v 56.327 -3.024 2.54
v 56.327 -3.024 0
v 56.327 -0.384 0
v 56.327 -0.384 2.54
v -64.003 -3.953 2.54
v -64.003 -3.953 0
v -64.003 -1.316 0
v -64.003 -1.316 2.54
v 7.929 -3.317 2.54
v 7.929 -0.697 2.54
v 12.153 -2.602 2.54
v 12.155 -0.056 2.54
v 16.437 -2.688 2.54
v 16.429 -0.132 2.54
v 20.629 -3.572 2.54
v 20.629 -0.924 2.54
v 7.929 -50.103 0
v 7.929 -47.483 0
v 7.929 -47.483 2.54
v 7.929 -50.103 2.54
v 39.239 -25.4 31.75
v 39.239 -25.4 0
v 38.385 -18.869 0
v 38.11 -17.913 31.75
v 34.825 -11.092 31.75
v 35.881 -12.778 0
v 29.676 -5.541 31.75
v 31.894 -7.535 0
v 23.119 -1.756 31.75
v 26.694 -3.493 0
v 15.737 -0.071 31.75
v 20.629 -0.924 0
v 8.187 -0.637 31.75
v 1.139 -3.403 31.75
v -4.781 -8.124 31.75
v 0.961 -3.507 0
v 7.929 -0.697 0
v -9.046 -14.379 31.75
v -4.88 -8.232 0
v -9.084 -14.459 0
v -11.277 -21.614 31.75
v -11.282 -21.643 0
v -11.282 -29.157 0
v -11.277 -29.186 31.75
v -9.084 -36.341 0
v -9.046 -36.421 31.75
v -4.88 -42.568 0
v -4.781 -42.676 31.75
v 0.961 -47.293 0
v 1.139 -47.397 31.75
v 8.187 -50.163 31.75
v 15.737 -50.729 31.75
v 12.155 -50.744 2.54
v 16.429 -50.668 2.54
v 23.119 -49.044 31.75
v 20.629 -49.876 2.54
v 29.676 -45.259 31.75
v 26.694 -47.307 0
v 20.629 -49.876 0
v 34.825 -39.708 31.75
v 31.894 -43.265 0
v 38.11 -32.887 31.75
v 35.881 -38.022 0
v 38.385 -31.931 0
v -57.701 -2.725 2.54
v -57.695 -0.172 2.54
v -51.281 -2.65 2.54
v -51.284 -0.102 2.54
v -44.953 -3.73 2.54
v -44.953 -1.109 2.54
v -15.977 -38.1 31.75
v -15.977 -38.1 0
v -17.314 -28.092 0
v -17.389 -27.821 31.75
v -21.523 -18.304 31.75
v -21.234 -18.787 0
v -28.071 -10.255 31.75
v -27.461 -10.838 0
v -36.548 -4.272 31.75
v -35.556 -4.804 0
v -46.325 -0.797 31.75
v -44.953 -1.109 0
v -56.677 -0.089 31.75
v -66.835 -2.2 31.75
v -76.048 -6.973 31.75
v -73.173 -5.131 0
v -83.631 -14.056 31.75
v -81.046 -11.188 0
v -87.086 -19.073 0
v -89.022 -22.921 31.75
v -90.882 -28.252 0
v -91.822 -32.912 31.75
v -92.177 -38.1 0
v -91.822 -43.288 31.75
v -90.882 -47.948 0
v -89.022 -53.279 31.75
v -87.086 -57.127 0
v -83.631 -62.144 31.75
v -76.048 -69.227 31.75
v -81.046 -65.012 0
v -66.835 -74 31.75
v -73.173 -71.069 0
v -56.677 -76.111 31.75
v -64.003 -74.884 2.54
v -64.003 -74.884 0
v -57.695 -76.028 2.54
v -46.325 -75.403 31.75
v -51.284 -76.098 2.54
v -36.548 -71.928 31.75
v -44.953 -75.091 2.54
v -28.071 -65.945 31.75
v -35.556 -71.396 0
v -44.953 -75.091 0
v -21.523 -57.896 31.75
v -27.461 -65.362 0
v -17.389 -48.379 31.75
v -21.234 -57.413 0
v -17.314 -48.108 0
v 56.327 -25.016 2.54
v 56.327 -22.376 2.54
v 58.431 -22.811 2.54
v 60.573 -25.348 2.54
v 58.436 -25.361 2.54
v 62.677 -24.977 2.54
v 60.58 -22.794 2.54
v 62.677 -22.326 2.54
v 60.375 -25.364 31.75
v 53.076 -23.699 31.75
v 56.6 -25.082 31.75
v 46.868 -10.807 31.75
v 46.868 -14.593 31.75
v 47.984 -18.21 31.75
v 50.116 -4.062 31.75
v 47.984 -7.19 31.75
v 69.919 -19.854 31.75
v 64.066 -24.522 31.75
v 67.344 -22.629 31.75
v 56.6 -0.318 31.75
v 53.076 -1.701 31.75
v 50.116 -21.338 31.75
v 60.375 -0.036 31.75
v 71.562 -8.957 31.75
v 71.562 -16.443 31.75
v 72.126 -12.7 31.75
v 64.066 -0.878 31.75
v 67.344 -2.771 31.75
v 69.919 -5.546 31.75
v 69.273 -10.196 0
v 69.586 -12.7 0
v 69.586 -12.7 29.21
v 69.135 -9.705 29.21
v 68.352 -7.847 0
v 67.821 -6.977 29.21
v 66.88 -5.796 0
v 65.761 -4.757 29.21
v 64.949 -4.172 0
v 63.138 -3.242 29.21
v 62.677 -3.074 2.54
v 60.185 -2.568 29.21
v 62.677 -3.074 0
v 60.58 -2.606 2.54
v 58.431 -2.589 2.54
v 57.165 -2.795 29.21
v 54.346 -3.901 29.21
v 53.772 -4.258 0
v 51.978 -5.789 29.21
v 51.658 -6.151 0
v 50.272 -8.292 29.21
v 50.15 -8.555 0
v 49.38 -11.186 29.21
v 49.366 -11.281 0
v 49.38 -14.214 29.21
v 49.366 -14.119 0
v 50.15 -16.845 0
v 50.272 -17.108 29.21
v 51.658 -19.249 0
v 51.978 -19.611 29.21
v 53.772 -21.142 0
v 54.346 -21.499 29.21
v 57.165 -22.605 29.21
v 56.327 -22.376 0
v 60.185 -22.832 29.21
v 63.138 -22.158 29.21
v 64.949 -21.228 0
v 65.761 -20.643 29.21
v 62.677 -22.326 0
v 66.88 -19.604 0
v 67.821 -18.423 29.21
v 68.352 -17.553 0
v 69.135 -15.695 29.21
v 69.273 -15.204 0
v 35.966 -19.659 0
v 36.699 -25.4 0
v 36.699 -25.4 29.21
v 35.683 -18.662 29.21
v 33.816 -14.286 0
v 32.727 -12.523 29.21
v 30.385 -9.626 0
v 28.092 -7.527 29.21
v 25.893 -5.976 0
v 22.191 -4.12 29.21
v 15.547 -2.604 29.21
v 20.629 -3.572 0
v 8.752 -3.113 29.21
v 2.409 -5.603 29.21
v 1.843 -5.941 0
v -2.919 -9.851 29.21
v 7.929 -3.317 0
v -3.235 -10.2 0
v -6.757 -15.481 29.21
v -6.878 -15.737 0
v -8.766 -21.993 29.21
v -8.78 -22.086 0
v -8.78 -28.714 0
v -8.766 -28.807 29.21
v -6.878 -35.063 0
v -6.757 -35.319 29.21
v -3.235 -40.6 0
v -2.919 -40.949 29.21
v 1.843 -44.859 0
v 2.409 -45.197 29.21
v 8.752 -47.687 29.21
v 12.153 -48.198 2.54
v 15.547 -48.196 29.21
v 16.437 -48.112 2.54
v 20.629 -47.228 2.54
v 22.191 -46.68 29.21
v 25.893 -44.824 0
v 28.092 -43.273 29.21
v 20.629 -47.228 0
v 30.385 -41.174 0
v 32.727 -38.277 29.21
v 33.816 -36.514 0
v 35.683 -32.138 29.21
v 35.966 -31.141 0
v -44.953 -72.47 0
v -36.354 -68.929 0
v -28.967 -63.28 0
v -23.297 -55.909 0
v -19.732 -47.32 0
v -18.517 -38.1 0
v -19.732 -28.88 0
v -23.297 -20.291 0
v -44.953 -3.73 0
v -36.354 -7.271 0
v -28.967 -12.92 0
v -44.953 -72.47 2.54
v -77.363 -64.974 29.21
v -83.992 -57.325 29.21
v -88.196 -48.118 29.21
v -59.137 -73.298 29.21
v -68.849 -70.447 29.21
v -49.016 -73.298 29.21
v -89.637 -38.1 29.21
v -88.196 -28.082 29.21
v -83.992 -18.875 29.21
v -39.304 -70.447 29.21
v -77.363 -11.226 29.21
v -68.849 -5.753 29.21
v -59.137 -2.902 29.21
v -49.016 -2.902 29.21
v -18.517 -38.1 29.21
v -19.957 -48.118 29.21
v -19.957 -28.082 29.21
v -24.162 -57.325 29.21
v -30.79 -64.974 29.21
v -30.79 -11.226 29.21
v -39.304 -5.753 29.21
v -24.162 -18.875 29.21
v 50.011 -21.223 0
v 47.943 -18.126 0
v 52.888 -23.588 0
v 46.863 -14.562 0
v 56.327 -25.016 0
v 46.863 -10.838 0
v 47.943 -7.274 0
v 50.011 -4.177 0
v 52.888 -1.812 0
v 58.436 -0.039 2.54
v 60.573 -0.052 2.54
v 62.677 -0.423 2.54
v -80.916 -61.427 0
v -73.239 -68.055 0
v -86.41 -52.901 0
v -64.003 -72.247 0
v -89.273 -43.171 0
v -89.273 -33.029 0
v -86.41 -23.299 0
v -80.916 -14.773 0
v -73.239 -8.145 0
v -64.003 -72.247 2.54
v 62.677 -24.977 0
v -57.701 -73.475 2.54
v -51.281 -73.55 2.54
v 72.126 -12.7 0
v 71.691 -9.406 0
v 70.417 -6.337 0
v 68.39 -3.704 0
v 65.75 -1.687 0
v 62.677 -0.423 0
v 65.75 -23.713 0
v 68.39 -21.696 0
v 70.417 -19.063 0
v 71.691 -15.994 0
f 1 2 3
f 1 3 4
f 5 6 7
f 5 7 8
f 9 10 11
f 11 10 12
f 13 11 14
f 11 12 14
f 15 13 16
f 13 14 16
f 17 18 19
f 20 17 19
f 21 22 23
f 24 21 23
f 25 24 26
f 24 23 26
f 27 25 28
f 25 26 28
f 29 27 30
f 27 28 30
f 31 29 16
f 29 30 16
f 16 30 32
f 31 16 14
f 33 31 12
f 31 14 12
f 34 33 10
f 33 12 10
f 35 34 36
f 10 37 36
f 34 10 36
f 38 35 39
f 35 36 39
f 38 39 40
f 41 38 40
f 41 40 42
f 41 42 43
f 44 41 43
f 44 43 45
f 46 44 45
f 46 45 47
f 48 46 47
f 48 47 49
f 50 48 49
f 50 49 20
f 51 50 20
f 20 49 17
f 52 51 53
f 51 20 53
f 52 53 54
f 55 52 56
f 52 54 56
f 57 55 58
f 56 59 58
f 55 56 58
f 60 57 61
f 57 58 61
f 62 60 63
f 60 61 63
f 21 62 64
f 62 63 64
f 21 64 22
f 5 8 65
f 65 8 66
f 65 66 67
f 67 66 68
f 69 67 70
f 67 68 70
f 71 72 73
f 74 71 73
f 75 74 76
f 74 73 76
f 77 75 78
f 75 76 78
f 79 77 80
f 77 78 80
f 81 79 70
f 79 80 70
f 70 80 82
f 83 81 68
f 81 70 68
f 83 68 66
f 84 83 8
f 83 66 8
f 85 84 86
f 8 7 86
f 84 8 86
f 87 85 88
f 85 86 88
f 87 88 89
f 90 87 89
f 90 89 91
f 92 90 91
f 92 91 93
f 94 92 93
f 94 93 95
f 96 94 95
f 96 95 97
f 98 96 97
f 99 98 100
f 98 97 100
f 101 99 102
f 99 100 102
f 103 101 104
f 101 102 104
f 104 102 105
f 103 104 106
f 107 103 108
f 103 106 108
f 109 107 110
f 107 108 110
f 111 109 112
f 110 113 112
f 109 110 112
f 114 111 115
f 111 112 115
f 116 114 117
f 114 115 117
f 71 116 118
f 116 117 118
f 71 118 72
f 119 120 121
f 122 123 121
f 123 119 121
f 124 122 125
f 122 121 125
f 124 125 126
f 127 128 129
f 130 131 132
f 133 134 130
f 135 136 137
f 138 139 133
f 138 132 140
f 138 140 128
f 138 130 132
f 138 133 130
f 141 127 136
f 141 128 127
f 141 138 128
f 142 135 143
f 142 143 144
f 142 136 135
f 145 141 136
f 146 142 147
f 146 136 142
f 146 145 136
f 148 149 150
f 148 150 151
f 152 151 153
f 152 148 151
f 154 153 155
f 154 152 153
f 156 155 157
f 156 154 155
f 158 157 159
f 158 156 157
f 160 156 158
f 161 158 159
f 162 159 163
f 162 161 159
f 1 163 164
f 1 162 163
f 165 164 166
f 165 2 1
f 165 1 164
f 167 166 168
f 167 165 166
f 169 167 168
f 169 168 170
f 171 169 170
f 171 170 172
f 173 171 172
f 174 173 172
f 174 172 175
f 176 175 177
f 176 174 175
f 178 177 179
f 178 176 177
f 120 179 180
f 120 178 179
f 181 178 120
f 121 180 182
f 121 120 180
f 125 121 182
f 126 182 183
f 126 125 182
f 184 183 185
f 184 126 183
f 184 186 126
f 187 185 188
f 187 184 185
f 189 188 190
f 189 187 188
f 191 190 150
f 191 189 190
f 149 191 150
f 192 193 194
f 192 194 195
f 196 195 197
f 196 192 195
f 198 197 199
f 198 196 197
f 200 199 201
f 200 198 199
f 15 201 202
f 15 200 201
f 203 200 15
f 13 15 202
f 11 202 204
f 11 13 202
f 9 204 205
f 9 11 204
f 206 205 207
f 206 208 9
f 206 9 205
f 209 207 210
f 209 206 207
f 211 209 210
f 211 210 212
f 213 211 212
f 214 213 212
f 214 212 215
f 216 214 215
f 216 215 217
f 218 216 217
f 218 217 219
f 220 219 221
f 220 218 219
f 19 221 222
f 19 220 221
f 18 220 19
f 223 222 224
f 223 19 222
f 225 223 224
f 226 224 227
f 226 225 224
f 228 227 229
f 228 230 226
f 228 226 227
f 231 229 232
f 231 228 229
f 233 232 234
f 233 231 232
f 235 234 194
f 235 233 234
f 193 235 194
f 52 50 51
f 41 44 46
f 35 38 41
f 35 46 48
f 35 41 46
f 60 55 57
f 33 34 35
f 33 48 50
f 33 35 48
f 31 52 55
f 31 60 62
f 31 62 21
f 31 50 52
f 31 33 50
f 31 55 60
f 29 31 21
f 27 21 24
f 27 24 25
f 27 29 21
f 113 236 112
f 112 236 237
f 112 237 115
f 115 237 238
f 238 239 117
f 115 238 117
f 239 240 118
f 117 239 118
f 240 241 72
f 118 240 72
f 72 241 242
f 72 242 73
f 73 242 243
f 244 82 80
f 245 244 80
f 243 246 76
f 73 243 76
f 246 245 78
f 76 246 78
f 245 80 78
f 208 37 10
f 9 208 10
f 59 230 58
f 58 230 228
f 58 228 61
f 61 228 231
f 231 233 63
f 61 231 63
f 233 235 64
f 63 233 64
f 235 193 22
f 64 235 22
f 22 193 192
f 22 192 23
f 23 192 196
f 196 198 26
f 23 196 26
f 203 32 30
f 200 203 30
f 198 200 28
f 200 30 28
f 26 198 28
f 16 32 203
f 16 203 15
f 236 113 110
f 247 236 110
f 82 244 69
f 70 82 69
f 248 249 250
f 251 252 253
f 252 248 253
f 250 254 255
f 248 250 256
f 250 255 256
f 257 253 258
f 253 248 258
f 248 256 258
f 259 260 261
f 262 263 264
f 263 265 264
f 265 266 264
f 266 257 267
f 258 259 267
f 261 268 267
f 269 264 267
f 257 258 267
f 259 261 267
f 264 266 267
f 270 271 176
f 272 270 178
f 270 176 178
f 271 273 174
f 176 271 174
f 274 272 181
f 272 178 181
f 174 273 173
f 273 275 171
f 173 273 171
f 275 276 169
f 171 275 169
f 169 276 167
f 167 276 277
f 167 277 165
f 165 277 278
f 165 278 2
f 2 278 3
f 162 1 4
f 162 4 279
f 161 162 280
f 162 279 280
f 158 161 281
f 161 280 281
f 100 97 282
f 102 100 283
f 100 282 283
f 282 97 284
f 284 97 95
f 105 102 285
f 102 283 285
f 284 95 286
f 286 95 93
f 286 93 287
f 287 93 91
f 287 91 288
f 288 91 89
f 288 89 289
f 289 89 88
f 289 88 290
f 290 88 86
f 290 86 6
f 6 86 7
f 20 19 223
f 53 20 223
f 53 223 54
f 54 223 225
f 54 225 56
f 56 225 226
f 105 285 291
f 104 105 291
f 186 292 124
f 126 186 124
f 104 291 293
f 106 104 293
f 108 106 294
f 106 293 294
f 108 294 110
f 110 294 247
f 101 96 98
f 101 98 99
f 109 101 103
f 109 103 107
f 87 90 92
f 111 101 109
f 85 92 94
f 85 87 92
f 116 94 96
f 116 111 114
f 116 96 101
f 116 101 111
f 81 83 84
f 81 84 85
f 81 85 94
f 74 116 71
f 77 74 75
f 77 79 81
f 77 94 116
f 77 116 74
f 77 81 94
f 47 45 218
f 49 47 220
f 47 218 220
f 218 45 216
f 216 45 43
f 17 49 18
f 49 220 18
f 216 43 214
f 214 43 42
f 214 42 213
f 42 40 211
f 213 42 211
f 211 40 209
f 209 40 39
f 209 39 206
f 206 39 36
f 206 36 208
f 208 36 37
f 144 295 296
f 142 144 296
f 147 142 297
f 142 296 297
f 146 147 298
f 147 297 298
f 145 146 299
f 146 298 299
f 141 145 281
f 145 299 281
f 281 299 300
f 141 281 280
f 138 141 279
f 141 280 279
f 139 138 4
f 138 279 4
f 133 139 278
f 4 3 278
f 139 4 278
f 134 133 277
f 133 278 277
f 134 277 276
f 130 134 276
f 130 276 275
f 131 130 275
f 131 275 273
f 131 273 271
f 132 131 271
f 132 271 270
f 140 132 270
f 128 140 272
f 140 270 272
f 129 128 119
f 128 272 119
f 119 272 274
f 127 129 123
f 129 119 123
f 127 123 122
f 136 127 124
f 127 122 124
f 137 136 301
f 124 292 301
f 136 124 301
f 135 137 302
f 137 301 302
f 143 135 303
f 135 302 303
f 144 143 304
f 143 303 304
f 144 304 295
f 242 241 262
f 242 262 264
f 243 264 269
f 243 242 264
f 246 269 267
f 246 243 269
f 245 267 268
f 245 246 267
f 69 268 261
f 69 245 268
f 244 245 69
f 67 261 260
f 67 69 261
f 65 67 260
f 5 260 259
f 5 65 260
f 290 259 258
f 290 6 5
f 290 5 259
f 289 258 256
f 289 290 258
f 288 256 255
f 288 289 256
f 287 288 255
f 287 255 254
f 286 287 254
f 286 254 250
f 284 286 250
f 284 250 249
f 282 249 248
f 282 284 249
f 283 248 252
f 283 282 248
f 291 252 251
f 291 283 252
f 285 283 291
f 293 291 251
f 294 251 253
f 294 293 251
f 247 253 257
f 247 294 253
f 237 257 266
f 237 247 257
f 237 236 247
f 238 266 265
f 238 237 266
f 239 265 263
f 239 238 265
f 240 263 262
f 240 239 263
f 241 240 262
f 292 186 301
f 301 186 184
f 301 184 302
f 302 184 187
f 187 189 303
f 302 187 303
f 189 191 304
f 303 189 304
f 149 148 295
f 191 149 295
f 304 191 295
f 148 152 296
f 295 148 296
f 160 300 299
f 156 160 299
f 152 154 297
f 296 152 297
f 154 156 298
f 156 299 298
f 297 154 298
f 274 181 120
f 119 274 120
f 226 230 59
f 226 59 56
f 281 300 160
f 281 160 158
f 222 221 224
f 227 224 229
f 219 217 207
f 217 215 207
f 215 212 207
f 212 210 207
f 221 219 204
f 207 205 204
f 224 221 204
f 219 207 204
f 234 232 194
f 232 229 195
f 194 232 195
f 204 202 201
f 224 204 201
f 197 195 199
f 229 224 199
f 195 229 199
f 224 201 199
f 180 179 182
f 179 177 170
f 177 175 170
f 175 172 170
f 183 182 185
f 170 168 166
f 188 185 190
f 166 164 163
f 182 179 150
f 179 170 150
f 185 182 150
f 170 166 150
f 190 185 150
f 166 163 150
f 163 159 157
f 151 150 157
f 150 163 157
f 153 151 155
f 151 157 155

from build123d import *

# Parameters (mm, degrees)
F0_R     = 38.1
F1_DEPTH = 31.75
F0_R_2   = 25.4
F0_R_3   = 12.7
F2_T     = -2.54
F2_2_T   = -2.54
F2_3_T   = -2.54
F3_W     = 6.35
F3_H     = 2.54
F3_W_2   = 12.7
F3_W_3   = 19.05
F4_DEPTH = 88.9


with BuildPart() as f1:
    # F0 (on Top) → F1 (new body)
    with BuildSketch(Plane.XY):
        with Locations((-54.076526314, -38.1)):
            Circle(F0_R)
    extrude(amount=F1_DEPTH)

    # F2#3
    f2_3_openings = [f1.faces().sort_by_distance(p)[0] for p in [
        (-54.076526, -38.1, 0),
    ]]
    offset(amount=F2_3_T, openings=f2_3_openings)


with BuildPart() as f1b:
    # F0 (on Top) → F1, piece 2 (new body)
    with BuildSketch(Plane.XY):
        with Locations((13.8389375061, -25.4)):
            Circle(F0_R_2)
    extrude(amount=F1_DEPTH)

    # F2
    f2_openings = [f1b.faces().sort_by_distance(p)[0] for p in [
        (13.838938, -25.4, 0),
    ]]
    offset(amount=F2_T, openings=f2_openings)


with BuildPart() as f1c:
    # F0 (on Top) → F1, piece 3 (new body)
    with BuildSketch(Plane.XY):
        with Locations((59.426035732, -12.7)):
            Circle(F0_R_3)
    extrude(amount=F1_DEPTH)

    # F2#2
    f2_2_openings = [f1c.faces().sort_by_distance(p)[0] for p in [
        (59.426036, -12.7, 0),
    ]]
    offset(amount=F2_2_T, openings=f2_2_openings)


with BuildPart() as f4_tool:
    # F3 (on Front) → F4 (new body)
    with BuildSketch(Plane.XZ):
        with Locations((59.5019853592, 1.27)):
            Rectangle(F3_W, F3_H)
        with Locations((14.2790494323, 1.27)):
            Rectangle(F3_W_2, F3_H)
        with Locations((-54.4776330948, 1.27)):
            Rectangle(F3_W_3, F3_H)
    extrude(amount=F4_DEPTH)


with BuildPart() as f1_1:
    add(f1.part)

    # F4: cut by f4_tool
    add(f4_tool.part, mode=Mode.SUBTRACT)


with BuildPart() as f1b_1:
    add(f1b.part)

    # F4: cut by f4_tool
    add(f4_tool.part, mode=Mode.SUBTRACT)


with BuildPart() as f1c_1:
    add(f1c.part)

    # F4: cut by f4_tool
    add(f4_tool.part, mode=Mode.SUBTRACT)


solid = Compound([f1_1.part, f1b_1.part, f1c_1.part])
